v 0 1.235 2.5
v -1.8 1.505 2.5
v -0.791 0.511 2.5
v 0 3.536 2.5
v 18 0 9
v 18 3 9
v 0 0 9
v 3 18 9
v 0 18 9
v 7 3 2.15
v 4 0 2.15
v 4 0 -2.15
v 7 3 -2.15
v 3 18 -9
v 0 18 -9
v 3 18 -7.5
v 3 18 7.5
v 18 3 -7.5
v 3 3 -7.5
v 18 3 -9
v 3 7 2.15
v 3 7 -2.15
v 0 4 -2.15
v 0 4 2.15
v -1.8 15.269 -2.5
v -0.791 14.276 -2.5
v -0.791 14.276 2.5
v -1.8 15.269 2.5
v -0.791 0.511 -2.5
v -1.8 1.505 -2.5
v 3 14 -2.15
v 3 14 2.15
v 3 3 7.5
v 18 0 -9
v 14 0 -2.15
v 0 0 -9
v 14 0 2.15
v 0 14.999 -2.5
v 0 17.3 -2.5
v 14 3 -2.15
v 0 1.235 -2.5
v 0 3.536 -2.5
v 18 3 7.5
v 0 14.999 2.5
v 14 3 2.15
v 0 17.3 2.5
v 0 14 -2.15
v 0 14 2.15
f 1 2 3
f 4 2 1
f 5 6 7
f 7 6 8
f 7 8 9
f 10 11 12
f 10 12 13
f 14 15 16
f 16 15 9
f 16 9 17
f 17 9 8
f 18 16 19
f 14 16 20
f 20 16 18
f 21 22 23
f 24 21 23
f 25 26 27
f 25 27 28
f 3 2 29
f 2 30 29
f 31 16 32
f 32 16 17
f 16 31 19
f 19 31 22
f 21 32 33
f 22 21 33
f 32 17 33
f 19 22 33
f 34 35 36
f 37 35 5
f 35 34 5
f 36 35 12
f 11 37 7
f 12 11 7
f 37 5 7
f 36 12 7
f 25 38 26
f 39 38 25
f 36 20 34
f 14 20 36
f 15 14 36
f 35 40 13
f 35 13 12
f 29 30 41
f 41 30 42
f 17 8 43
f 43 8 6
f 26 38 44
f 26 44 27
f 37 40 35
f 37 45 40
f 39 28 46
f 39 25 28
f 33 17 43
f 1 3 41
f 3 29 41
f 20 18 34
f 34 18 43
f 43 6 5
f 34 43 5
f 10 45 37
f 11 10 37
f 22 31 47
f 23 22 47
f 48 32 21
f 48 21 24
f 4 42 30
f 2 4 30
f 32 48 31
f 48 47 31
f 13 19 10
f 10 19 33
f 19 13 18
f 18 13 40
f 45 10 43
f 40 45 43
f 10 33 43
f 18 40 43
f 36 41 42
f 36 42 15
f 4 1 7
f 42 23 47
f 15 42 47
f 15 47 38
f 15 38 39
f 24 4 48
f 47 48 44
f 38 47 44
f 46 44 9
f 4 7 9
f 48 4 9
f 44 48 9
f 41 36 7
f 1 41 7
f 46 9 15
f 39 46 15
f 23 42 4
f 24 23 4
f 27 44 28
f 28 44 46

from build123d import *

# Parameters (mm, degrees)
BOSS_EXTRUDE1_DEPTH = 9
CUT_EXTRUDE1_DEPTH  = 7.5
CUT_EXTRUDE2_DEPTH  = 2.15
BOSS_EXTRUDE2_DEPTH = 2.5
SKETCH8_W           = 5
SKETCH8_H           = 2.300783428
SKETCH8_H_2         = 2.300783429
CUT_EXTRUDE6_DEPTH  = 2.54


with BuildPart() as part:
    # Sketch1 → Boss-Extrude1 (new, symmetric)
    with BuildSketch(Plane.XY):
        Polygon((0, 0), (0, 18), (3, 18), (18, 3), (18, 0), align=None)
    extrude(amount=BOSS_EXTRUDE1_DEPTH, both=True)

    # Sketch2 → Cut-Extrude1 (cut, symmetric)
    with BuildSketch(Plane.XY):
        Polygon((3, 18), (3, 3), (18, 3), align=None)
    extrude(amount=CUT_EXTRUDE1_DEPTH, both=True, mode=Mode.SUBTRACT)

    # Sketch3 → Cut-Extrude2 (cut, symmetric)
    with BuildSketch(Plane.XY):
        Polygon((0, 14), (3, 14), (3, 7), (0, 4), align=None)
        Polygon((7, 3), (14, 3), (14, 0), (4, 0), align=None)
    extrude(amount=CUT_EXTRUDE2_DEPTH, both=True, mode=Mode.SUBTRACT)

    # Sketch4 → Boss-Extrude2 (add, symmetric)
    with BuildSketch(Plane.XY):
        Polygon((1.504575227, -1.8), (0.511249685, -0.790946088), (1.234750477, 0), (3.535533906, 0), align=None)
        Polygon((0, 3.535533906), (-1.8, 1.504575227), (-0.790946088, 0.511249685), (0, 1.234750477), align=None)
        Polygon((0, 17.3), (0, 14.999216572), (-0.790946088, 14.275715779), (-1.8, 15.269041321), align=None)
        Polygon((14.999216572, 0), (14.275715779, -0.790946088), (15.269041321, -1.8), (17.3, 0), align=None)
    extrude(amount=BOSS_EXTRUDE2_DEPTH, both=True)

    # Sketch8 → Cut-Extrude6 (cut)
    with BuildSketch(Plane(origin=(114.3, 0, -271.000209725), x_dir=(0, 0, 1), z_dir=(0, 1, 0))):
        with Locations((271.000209725, -98.150391714)):
            Rectangle(SKETCH8_W, SKETCH8_H)
        with Locations((271.000209725, -111.914857809)):
            Rectangle(SKETCH8_W, SKETCH8_H_2)
    extrude(amount=-CUT_EXTRUDE6_DEPTH, mode=Mode.SUBTRACT)


with BuildPart() as cut_extrude6_kept_piece:
    # of the separate pieces the step leaves, the one the design keeps (cut_extrude6_pieces_kept)
    add(part.part.solids().sort_by_distance((0, 0, -9))[0])


solid = cut_extrude6_kept_piece.part
